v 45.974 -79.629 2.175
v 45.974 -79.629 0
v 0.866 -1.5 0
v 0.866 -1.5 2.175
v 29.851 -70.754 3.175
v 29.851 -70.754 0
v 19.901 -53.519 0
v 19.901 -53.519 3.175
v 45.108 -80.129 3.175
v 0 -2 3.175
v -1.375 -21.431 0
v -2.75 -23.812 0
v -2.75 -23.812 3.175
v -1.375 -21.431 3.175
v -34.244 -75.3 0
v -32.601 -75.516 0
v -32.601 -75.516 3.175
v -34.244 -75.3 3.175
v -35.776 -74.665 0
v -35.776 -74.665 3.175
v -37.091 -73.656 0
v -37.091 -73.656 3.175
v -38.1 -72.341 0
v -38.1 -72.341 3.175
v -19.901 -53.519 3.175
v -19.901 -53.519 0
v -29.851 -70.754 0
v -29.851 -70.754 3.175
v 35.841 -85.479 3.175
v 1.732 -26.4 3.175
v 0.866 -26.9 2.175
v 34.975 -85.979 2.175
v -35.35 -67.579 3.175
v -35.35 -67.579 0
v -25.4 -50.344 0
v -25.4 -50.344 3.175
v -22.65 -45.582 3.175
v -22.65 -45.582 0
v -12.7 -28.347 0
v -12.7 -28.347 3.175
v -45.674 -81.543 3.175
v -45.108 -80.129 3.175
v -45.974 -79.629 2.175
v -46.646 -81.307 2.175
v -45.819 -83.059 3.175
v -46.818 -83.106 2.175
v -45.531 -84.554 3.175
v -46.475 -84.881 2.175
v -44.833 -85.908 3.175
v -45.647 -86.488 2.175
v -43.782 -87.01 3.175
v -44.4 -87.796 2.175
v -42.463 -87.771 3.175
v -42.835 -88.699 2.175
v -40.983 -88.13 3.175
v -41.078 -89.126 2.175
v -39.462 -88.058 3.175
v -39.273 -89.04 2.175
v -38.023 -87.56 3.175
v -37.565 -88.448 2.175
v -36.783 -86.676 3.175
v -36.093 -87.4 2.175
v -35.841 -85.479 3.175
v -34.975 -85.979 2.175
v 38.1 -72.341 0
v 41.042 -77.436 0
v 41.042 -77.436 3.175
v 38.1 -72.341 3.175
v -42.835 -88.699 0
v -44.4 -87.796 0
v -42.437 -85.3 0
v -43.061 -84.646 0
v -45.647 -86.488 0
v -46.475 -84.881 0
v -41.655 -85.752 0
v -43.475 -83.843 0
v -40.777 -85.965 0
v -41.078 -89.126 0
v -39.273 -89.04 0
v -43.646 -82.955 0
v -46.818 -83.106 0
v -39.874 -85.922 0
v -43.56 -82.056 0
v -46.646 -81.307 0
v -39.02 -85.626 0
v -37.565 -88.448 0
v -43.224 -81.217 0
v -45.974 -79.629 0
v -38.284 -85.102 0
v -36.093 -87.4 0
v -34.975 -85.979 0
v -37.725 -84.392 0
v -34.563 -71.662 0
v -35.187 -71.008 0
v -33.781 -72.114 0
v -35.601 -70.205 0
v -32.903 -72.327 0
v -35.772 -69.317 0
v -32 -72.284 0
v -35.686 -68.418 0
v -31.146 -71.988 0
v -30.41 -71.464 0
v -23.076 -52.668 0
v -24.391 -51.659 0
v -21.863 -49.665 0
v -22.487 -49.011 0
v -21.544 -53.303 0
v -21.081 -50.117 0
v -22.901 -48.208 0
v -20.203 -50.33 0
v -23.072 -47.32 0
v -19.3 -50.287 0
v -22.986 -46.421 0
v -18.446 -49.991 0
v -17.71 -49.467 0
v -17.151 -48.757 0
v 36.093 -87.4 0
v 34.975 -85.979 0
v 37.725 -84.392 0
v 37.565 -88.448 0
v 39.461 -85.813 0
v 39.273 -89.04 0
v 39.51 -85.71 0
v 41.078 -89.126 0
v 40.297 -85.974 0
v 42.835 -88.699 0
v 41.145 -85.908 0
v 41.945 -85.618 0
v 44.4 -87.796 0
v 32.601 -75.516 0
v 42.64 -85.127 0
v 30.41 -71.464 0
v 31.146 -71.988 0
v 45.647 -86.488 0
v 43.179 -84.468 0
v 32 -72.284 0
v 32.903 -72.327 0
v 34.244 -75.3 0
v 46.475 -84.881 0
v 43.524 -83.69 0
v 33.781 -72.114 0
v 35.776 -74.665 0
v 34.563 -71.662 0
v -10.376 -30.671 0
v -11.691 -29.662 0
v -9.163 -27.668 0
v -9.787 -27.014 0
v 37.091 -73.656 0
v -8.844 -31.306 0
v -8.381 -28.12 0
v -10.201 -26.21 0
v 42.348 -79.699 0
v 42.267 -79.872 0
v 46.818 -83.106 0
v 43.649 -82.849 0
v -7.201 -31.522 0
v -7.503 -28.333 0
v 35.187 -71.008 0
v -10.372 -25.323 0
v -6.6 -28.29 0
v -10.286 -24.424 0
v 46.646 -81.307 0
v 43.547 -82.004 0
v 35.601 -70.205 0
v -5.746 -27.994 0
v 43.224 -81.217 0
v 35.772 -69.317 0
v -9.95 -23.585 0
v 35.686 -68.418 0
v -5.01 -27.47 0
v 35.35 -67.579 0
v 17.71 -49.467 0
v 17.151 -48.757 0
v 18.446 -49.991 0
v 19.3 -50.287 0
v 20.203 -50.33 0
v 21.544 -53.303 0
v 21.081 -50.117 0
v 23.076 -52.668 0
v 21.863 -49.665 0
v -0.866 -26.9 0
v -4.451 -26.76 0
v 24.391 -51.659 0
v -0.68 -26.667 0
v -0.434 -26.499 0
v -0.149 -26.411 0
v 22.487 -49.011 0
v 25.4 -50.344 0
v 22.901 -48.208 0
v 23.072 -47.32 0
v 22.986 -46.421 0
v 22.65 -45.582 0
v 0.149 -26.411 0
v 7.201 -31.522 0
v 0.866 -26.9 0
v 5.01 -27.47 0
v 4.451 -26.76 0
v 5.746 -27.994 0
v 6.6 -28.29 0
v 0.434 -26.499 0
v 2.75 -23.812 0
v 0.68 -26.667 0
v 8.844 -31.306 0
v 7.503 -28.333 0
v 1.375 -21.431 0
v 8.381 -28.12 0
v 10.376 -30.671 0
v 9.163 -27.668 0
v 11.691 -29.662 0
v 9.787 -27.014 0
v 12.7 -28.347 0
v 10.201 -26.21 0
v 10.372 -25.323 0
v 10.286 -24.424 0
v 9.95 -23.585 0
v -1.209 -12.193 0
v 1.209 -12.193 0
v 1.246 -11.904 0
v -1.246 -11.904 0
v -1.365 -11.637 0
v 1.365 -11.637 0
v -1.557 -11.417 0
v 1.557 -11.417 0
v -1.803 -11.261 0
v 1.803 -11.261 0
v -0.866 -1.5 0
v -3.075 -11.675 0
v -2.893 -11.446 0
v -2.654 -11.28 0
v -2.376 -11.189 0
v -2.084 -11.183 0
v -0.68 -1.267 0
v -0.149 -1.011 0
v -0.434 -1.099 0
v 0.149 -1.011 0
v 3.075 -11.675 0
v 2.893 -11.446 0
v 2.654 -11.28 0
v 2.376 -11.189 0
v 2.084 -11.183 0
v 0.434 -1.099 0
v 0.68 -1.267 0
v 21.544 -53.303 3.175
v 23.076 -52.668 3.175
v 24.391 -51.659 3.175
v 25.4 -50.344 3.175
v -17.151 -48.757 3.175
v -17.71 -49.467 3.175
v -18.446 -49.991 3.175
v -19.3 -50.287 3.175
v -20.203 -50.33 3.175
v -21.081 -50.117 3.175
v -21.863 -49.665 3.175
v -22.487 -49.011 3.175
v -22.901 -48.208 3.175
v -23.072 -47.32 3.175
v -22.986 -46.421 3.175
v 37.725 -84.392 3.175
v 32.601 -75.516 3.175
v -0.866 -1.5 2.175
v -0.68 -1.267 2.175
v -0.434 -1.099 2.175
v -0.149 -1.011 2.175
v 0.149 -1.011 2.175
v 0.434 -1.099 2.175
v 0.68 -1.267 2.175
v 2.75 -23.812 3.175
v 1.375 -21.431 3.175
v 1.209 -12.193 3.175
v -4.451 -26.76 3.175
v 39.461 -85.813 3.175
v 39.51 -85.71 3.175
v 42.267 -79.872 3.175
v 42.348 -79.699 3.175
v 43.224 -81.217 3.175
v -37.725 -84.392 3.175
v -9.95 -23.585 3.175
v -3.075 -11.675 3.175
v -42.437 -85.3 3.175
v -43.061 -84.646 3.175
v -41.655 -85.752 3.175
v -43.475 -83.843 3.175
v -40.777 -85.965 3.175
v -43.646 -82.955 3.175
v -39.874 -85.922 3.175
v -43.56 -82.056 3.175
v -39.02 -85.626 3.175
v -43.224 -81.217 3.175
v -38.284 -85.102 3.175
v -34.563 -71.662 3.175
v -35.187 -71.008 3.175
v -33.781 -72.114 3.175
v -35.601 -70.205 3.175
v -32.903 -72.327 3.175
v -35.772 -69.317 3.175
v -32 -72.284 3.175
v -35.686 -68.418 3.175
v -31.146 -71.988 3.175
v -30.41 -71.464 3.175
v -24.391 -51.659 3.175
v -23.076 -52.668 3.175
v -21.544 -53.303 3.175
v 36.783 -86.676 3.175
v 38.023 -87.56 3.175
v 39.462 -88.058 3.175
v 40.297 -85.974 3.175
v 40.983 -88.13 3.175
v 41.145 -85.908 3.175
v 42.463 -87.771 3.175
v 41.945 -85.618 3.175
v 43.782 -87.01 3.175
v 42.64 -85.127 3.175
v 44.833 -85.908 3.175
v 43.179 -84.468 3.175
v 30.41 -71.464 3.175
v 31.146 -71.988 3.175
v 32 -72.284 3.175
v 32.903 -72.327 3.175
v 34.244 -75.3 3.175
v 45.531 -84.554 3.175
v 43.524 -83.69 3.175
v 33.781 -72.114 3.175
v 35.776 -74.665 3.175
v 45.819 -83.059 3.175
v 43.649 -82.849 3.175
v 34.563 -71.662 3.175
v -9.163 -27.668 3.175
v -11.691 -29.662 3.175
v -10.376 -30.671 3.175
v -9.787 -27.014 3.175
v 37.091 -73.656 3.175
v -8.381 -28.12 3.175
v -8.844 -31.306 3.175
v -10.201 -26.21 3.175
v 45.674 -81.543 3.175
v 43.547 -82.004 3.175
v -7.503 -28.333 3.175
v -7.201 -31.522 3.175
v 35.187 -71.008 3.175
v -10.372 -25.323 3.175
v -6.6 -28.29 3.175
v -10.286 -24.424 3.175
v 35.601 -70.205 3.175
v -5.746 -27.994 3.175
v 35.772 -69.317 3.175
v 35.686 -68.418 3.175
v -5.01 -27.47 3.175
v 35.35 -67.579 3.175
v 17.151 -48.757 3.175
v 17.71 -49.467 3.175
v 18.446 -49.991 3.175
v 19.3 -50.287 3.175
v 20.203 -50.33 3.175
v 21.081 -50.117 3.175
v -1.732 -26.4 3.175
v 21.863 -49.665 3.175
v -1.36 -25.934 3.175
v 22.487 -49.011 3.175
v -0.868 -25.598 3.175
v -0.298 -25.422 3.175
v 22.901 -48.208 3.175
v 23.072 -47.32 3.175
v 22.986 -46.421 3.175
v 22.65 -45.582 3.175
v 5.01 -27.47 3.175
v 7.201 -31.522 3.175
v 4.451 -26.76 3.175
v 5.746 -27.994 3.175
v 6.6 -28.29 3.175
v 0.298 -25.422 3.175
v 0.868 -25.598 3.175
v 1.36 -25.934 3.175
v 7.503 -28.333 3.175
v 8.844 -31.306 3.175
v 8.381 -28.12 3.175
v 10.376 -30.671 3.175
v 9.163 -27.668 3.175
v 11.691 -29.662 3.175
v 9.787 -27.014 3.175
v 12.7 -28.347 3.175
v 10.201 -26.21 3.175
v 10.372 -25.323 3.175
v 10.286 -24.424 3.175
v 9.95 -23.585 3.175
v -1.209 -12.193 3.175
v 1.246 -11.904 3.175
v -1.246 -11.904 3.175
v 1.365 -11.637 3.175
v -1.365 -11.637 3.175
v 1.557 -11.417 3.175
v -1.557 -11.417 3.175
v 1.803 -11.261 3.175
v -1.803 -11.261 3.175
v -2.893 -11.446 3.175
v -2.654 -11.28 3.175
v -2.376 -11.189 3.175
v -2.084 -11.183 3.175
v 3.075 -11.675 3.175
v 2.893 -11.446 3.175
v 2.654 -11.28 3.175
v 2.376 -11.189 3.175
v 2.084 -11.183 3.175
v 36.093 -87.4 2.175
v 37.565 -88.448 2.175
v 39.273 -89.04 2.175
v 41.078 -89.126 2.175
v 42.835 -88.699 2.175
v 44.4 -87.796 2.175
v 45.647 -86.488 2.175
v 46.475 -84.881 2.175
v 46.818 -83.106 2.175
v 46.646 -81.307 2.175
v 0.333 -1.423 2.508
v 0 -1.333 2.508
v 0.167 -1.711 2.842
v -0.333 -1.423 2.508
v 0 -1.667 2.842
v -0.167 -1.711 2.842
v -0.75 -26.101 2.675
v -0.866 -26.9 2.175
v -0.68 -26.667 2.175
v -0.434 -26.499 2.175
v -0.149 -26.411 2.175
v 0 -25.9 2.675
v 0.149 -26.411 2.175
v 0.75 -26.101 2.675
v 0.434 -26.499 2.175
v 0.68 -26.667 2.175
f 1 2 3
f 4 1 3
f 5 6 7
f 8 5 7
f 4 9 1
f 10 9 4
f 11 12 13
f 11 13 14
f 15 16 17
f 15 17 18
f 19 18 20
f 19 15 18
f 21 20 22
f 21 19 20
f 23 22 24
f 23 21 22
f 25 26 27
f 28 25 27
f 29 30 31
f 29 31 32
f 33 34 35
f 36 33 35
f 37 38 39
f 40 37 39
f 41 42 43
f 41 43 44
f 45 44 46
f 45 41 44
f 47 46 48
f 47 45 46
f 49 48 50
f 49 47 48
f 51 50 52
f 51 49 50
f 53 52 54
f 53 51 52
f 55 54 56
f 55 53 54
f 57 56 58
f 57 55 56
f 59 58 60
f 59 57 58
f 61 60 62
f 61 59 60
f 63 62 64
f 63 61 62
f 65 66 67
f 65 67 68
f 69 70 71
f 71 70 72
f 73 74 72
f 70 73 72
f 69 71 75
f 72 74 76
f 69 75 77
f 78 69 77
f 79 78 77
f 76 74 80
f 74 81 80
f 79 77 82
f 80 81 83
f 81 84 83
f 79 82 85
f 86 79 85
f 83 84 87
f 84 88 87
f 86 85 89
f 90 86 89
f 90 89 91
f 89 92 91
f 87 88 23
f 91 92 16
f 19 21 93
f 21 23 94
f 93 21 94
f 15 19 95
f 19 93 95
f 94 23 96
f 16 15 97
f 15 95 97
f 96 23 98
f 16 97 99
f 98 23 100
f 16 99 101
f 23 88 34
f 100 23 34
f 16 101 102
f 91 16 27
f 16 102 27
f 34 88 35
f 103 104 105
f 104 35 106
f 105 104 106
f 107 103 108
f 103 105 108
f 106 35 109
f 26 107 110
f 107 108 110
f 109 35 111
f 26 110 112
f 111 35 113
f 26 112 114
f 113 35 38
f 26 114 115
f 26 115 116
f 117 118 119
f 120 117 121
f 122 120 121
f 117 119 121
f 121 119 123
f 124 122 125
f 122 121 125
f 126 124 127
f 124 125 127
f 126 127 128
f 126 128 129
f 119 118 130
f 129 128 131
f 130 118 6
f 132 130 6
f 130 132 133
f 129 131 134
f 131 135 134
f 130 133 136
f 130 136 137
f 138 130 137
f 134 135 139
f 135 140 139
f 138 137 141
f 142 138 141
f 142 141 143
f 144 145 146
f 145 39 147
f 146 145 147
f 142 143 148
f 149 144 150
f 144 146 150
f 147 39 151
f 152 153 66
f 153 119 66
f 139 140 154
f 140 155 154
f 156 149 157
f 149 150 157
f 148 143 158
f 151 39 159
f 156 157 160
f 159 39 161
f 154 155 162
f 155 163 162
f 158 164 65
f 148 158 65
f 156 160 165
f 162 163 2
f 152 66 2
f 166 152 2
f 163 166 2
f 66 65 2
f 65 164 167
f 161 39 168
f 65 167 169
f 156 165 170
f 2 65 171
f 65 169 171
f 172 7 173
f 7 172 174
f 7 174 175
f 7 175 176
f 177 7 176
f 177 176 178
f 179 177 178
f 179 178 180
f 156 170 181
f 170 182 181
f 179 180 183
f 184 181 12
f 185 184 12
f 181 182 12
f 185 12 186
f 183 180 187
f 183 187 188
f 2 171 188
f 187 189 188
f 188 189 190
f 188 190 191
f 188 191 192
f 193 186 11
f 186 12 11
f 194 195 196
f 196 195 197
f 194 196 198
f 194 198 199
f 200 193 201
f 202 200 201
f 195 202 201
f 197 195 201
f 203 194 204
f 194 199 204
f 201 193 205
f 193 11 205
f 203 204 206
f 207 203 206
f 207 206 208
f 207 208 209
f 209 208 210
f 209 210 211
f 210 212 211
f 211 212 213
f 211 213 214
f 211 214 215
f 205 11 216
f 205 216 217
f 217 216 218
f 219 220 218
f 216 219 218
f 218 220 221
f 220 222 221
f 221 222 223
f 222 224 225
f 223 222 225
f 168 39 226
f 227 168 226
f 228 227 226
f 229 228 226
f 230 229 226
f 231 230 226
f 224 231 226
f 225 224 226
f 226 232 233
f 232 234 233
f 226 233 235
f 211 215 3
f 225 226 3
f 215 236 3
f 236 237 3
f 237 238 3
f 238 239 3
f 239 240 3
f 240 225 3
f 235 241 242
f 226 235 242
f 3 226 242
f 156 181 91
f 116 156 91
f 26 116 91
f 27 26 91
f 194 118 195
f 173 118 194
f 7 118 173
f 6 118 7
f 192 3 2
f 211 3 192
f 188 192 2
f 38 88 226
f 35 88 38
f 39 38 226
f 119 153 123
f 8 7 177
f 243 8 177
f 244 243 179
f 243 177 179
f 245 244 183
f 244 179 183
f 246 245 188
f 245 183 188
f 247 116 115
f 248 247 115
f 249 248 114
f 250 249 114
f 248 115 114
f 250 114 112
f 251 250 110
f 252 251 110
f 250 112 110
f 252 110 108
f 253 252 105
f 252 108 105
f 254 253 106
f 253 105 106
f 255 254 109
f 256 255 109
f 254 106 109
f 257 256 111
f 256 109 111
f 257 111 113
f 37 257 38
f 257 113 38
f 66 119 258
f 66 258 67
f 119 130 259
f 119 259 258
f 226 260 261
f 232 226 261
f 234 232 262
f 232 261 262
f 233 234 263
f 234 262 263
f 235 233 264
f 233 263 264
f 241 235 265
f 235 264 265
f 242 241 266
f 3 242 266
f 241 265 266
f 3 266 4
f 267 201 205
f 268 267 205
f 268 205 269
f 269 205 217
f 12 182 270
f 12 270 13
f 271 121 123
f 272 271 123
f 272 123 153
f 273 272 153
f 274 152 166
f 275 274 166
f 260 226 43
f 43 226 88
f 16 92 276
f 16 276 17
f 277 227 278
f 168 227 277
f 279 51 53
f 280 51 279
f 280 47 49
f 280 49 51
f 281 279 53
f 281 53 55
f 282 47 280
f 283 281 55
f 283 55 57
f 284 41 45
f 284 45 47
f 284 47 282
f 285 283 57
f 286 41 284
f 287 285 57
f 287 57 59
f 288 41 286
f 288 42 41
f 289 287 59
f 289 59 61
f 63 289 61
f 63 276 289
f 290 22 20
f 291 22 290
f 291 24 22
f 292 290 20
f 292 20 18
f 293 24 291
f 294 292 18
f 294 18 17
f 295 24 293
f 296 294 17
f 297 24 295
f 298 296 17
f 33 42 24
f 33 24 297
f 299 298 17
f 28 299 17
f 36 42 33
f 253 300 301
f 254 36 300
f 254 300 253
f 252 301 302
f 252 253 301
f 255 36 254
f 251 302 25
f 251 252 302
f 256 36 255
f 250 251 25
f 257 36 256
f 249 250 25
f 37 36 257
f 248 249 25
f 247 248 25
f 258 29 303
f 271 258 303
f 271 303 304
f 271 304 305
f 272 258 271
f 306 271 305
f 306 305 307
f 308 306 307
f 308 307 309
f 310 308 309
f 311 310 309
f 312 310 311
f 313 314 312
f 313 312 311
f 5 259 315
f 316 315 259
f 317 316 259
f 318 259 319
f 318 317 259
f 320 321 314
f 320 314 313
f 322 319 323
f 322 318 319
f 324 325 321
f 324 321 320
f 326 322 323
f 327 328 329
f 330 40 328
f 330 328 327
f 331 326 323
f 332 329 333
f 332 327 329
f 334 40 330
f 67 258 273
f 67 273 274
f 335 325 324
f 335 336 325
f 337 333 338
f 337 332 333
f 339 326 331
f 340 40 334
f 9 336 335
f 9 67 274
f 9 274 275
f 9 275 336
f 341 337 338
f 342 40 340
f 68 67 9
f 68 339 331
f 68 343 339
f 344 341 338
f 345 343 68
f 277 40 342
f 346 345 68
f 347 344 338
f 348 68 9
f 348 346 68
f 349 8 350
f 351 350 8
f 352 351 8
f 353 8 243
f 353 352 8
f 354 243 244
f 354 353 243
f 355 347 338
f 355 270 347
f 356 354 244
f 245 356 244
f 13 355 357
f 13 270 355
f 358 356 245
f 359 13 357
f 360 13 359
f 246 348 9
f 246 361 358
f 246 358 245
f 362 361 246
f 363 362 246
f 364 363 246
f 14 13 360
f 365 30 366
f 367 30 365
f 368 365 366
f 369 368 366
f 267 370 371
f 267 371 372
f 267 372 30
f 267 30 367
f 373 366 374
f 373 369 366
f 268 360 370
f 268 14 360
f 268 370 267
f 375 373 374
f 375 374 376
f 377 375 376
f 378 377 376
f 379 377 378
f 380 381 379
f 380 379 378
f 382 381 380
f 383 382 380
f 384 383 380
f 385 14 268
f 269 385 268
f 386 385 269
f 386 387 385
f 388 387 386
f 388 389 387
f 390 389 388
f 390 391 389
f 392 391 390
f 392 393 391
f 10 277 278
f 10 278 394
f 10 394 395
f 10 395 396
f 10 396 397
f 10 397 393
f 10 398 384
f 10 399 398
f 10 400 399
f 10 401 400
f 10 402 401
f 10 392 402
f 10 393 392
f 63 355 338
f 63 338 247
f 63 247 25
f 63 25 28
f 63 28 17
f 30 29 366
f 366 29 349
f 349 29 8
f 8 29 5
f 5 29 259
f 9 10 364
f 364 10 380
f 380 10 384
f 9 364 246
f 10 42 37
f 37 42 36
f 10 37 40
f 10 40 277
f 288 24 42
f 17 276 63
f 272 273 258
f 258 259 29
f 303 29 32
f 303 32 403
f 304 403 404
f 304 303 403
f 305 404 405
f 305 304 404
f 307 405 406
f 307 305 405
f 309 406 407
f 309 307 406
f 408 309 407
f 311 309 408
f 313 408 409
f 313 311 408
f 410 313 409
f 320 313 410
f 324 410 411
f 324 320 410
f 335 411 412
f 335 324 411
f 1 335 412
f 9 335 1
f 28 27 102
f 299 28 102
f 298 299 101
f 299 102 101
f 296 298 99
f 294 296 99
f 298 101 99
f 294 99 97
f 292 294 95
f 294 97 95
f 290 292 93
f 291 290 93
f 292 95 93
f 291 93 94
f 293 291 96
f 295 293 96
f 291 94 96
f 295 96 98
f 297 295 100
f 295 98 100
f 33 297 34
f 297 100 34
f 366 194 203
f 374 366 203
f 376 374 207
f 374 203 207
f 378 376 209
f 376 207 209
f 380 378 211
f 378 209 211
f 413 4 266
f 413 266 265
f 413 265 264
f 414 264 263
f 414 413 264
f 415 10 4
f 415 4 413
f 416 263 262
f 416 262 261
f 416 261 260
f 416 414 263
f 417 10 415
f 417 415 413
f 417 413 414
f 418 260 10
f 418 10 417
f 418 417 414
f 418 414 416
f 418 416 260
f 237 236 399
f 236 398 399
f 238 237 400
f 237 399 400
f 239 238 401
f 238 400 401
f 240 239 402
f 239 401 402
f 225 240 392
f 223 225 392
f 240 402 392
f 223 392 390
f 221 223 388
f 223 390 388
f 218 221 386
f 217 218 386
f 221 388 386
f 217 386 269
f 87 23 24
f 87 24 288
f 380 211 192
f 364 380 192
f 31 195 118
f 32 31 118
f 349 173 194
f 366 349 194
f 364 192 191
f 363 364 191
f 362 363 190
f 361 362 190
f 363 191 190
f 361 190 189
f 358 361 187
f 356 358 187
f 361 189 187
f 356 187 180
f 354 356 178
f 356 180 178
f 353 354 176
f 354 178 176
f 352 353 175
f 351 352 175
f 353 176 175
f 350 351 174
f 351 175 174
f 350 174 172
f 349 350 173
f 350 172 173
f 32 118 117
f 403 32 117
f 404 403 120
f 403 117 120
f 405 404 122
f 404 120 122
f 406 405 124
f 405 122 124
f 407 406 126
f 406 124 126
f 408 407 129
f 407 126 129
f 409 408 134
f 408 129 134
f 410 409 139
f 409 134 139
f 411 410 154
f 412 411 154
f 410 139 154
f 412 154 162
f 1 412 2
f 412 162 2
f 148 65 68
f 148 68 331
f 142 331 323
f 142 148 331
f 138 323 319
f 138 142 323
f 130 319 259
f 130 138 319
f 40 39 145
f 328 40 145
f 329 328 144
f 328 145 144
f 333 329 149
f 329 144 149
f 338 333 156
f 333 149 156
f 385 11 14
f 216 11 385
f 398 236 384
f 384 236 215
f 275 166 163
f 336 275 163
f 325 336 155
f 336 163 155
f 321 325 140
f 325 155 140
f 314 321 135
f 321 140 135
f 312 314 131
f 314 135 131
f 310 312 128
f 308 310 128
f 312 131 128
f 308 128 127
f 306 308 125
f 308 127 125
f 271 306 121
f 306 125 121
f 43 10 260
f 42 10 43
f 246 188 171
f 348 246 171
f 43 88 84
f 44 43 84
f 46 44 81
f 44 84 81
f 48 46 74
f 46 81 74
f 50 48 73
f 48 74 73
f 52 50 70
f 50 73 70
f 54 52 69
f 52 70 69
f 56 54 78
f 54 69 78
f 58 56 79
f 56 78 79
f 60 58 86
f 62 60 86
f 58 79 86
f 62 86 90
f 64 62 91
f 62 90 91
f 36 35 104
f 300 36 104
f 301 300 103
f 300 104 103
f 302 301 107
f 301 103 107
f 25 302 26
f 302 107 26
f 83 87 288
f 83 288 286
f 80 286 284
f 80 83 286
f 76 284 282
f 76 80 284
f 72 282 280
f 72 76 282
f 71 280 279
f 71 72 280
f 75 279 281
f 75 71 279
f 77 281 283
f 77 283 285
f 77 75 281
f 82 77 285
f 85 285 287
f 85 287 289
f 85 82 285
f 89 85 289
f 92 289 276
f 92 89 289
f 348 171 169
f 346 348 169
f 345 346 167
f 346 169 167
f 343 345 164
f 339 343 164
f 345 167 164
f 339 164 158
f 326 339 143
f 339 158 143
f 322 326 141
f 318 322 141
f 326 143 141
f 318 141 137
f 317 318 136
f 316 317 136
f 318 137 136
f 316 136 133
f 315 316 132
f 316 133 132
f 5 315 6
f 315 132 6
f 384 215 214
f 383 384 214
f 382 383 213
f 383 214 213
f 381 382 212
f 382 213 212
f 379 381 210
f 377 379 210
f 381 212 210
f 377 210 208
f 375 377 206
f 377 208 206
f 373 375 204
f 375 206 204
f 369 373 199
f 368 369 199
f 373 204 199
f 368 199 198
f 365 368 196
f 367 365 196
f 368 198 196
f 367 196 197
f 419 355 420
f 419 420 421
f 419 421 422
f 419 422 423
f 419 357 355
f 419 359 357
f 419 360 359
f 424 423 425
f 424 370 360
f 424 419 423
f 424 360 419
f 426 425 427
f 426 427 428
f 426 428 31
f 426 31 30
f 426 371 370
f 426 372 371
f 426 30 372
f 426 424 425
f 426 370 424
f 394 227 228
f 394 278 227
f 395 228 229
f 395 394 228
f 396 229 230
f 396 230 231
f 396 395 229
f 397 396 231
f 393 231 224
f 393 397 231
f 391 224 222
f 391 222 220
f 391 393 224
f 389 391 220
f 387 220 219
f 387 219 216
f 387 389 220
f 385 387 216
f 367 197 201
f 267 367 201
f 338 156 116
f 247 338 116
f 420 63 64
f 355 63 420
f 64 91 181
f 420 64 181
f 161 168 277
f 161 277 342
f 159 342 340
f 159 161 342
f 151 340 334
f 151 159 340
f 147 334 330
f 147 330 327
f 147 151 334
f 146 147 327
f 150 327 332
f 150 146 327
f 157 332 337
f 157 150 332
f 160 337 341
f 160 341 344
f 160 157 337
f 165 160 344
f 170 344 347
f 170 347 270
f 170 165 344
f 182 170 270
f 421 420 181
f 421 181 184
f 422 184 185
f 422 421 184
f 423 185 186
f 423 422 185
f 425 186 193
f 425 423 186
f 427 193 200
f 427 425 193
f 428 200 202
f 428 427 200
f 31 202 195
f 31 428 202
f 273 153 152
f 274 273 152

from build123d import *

# Parameters (mm, degrees)
BOSS_EXTRUDE1_DEPTH = 3.175
FILLET1_R           = 1
FILLET2_R           = 1
CHAMFER1_SIZE       = 1


with BuildPart() as part:
    # Sketch1 → Boss-Extrude1 (new body)
    with BuildSketch(Plane.XY):
        with BuildLine():
            Line((0, 0), (-45.974, -79.629303827))
            ThreePointArc((-45.974, -79.629303827), (-43.649738686, -88.303565141), (-34.975477372, -85.979303827))
            Line((-34.975477372, -85.979303827), (0, -25.4))
            Line((0, -25.4), (34.975477372, -85.979303827))
            ThreePointArc((34.975477372, -85.979303827), (43.649738686, -88.303565141), (45.974, -79.629303827))
            Line((45.974, -79.629303827), (0, 0))
        make_face()
        with BuildLine():
            Line((-1.139014765, -8.322831444), (-9.950369343, -23.584545256))
            ThreePointArc((-9.950369343, -23.584545256), (-8.788238686, -27.921675913), (-4.451108029, -26.759545256))
            Line((-4.451108029, -26.759545256), (-2.749630657, -23.8125))
            Line((-2.749630657, -23.8125), (-1.374815329, -21.43125))
            Line((-1.374815329, -21.43125), (-1.139014765, -8.322831444))
        make_face(mode=Mode.SUBTRACT)
        with BuildLine():
            Line((-38.1, -72.341135768), (-43.224369343, -81.216803827))
            ThreePointArc((-43.224369343, -81.216803827), (-42.062238686, -85.553934484), (-37.725108029, -84.391803827))
            Line((-37.725108029, -84.391803827), (-32.600738686, -75.516135768))
            ThreePointArc((-32.600738686, -75.516135768), (-35.775738686, -74.665397082), (-38.1, -72.341135768))
        make_face(mode=Mode.SUBTRACT)
        with BuildLine():
            Line((-19.900738686, -53.519090512), (-29.851108029, -70.753635768))
            ThreePointArc((-29.851108029, -70.753635768), (-34.188238686, -71.915766425), (-35.350369343, -67.578635768))
            Line((-35.350369343, -67.578635768), (-25.4, -50.344090512))
            ThreePointArc((-25.4, -50.344090512), (-23.075738686, -52.668351826), (-19.900738686, -53.519090512))
        make_face(mode=Mode.SUBTRACT)
        with BuildLine():
            Line((-7.200738686, -31.522045256), (-17.151108029, -48.756590512))
            ThreePointArc((-17.151108029, -48.756590512), (-21.488238686, -49.918721169), (-22.650369343, -45.581590512))
            Line((-22.650369343, -45.581590512), (-12.7, -28.347045256))
            ThreePointArc((-12.7, -28.347045256), (-10.375738686, -30.67130657), (-7.200738686, -31.522045256))
        make_face(mode=Mode.SUBTRACT)
        with BuildLine():
            Line((2.749630657, -23.8125), (1.374815329, -21.43125))
            Line((1.374815329, -21.43125), (1.139014765, -8.322831444))
            Line((1.139014765, -8.322831444), (9.950369343, -23.584545256))
            ThreePointArc((9.950369343, -23.584545256), (8.788238686, -27.921675913), (4.451108029, -26.759545256))
            Line((4.451108029, -26.759545256), (2.749630657, -23.8125))
        make_face(mode=Mode.SUBTRACT)
        with BuildLine():
            Line((12.7, -28.347045256), (22.650369343, -45.581590512))
            ThreePointArc((22.650369343, -45.581590512), (21.488238686, -49.918721169), (17.151108029, -48.756590512))
            Line((17.151108029, -48.756590512), (7.200738686, -31.522045256))
            ThreePointArc((7.200738686, -31.522045256), (10.375738686, -30.67130657), (12.7, -28.347045256))
        make_face(mode=Mode.SUBTRACT)
        with BuildLine():
            Line((25.4, -50.344090512), (35.350369343, -67.578635768))
            ThreePointArc((35.350369343, -67.578635768), (34.188238686, -71.915766425), (29.851108029, -70.753635768))
            Line((29.851108029, -70.753635768), (19.900738686, -53.519090512))
            ThreePointArc((19.900738686, -53.519090512), (23.075738686, -52.668351826), (25.4, -50.344090512))
        make_face(mode=Mode.SUBTRACT)
        with BuildLine():
            Line((32.600738686, -75.516135768), (37.725108029, -84.391803827))
            Line((37.725108029, -84.391803827), (41.041728895, -77.436359677))
            Line((41.041728895, -77.436359677), (38.1, -72.341135768))
            ThreePointArc((38.1, -72.341135768), (35.775738686, -74.665397082), (32.600738686, -75.516135768))
        make_face(mode=Mode.SUBTRACT)
        with BuildLine():
            Line((39.510088039, -85.709715542), (42.266670891, -79.871944556))
            Line((42.266670891, -79.871944556), (42.348213443, -79.699257294))
            Line((42.348213443, -79.699257294), (43.224369343, -81.216803827))
            ThreePointArc((43.224369343, -81.216803827), (42.931408354, -84.815621589), (39.461225977, -85.813193487))
            Line((39.461225977, -85.813193487), (39.510088039, -85.709715542))
        make_face(mode=Mode.SUBTRACT)
    extrude(amount=BOSS_EXTRUDE1_DEPTH)

    # Fillet1
    fillet1_edges = [part.edges().sort_by_distance(p)[0] for p in [
        (0, 0, 1.5875),
        (-1.139014765, -8.322831444, 1.5875),
        (1.139014765, -8.322831444, 1.5875),
    ]]
    fillet(fillet1_edges, radius=FILLET1_R)

    # Fillet2
    fillet2_edges = [part.edges().sort_by_distance(p)[0] for p in [
        (0, -25.4, 1.5875),
    ]]
    fillet(fillet2_edges, radius=FILLET2_R)

    # Chamfer1
    chamfer1_edges = [part.edges().sort_by_distance(p)[0] for p in [
        (-43.649738686, -88.303565141, 3.175),
        (-17.920751388, -56.439651914, 3.175),
        (-23.420012702, -40.564651914, 3.175),
        (0, -1, 3.175),
        (17.920751388, -56.439651914, 3.175),
        (0, -26.4, 3.175),
        (43.649738686, -88.303565141, 3.175),
        (23.420012702, -40.564651914, 3.175),
    ]]
    chamfer(chamfer1_edges, length=CHAMFER1_SIZE - 0.0001)  # a hair under: the kernel refuses the full size


solid = part.part
